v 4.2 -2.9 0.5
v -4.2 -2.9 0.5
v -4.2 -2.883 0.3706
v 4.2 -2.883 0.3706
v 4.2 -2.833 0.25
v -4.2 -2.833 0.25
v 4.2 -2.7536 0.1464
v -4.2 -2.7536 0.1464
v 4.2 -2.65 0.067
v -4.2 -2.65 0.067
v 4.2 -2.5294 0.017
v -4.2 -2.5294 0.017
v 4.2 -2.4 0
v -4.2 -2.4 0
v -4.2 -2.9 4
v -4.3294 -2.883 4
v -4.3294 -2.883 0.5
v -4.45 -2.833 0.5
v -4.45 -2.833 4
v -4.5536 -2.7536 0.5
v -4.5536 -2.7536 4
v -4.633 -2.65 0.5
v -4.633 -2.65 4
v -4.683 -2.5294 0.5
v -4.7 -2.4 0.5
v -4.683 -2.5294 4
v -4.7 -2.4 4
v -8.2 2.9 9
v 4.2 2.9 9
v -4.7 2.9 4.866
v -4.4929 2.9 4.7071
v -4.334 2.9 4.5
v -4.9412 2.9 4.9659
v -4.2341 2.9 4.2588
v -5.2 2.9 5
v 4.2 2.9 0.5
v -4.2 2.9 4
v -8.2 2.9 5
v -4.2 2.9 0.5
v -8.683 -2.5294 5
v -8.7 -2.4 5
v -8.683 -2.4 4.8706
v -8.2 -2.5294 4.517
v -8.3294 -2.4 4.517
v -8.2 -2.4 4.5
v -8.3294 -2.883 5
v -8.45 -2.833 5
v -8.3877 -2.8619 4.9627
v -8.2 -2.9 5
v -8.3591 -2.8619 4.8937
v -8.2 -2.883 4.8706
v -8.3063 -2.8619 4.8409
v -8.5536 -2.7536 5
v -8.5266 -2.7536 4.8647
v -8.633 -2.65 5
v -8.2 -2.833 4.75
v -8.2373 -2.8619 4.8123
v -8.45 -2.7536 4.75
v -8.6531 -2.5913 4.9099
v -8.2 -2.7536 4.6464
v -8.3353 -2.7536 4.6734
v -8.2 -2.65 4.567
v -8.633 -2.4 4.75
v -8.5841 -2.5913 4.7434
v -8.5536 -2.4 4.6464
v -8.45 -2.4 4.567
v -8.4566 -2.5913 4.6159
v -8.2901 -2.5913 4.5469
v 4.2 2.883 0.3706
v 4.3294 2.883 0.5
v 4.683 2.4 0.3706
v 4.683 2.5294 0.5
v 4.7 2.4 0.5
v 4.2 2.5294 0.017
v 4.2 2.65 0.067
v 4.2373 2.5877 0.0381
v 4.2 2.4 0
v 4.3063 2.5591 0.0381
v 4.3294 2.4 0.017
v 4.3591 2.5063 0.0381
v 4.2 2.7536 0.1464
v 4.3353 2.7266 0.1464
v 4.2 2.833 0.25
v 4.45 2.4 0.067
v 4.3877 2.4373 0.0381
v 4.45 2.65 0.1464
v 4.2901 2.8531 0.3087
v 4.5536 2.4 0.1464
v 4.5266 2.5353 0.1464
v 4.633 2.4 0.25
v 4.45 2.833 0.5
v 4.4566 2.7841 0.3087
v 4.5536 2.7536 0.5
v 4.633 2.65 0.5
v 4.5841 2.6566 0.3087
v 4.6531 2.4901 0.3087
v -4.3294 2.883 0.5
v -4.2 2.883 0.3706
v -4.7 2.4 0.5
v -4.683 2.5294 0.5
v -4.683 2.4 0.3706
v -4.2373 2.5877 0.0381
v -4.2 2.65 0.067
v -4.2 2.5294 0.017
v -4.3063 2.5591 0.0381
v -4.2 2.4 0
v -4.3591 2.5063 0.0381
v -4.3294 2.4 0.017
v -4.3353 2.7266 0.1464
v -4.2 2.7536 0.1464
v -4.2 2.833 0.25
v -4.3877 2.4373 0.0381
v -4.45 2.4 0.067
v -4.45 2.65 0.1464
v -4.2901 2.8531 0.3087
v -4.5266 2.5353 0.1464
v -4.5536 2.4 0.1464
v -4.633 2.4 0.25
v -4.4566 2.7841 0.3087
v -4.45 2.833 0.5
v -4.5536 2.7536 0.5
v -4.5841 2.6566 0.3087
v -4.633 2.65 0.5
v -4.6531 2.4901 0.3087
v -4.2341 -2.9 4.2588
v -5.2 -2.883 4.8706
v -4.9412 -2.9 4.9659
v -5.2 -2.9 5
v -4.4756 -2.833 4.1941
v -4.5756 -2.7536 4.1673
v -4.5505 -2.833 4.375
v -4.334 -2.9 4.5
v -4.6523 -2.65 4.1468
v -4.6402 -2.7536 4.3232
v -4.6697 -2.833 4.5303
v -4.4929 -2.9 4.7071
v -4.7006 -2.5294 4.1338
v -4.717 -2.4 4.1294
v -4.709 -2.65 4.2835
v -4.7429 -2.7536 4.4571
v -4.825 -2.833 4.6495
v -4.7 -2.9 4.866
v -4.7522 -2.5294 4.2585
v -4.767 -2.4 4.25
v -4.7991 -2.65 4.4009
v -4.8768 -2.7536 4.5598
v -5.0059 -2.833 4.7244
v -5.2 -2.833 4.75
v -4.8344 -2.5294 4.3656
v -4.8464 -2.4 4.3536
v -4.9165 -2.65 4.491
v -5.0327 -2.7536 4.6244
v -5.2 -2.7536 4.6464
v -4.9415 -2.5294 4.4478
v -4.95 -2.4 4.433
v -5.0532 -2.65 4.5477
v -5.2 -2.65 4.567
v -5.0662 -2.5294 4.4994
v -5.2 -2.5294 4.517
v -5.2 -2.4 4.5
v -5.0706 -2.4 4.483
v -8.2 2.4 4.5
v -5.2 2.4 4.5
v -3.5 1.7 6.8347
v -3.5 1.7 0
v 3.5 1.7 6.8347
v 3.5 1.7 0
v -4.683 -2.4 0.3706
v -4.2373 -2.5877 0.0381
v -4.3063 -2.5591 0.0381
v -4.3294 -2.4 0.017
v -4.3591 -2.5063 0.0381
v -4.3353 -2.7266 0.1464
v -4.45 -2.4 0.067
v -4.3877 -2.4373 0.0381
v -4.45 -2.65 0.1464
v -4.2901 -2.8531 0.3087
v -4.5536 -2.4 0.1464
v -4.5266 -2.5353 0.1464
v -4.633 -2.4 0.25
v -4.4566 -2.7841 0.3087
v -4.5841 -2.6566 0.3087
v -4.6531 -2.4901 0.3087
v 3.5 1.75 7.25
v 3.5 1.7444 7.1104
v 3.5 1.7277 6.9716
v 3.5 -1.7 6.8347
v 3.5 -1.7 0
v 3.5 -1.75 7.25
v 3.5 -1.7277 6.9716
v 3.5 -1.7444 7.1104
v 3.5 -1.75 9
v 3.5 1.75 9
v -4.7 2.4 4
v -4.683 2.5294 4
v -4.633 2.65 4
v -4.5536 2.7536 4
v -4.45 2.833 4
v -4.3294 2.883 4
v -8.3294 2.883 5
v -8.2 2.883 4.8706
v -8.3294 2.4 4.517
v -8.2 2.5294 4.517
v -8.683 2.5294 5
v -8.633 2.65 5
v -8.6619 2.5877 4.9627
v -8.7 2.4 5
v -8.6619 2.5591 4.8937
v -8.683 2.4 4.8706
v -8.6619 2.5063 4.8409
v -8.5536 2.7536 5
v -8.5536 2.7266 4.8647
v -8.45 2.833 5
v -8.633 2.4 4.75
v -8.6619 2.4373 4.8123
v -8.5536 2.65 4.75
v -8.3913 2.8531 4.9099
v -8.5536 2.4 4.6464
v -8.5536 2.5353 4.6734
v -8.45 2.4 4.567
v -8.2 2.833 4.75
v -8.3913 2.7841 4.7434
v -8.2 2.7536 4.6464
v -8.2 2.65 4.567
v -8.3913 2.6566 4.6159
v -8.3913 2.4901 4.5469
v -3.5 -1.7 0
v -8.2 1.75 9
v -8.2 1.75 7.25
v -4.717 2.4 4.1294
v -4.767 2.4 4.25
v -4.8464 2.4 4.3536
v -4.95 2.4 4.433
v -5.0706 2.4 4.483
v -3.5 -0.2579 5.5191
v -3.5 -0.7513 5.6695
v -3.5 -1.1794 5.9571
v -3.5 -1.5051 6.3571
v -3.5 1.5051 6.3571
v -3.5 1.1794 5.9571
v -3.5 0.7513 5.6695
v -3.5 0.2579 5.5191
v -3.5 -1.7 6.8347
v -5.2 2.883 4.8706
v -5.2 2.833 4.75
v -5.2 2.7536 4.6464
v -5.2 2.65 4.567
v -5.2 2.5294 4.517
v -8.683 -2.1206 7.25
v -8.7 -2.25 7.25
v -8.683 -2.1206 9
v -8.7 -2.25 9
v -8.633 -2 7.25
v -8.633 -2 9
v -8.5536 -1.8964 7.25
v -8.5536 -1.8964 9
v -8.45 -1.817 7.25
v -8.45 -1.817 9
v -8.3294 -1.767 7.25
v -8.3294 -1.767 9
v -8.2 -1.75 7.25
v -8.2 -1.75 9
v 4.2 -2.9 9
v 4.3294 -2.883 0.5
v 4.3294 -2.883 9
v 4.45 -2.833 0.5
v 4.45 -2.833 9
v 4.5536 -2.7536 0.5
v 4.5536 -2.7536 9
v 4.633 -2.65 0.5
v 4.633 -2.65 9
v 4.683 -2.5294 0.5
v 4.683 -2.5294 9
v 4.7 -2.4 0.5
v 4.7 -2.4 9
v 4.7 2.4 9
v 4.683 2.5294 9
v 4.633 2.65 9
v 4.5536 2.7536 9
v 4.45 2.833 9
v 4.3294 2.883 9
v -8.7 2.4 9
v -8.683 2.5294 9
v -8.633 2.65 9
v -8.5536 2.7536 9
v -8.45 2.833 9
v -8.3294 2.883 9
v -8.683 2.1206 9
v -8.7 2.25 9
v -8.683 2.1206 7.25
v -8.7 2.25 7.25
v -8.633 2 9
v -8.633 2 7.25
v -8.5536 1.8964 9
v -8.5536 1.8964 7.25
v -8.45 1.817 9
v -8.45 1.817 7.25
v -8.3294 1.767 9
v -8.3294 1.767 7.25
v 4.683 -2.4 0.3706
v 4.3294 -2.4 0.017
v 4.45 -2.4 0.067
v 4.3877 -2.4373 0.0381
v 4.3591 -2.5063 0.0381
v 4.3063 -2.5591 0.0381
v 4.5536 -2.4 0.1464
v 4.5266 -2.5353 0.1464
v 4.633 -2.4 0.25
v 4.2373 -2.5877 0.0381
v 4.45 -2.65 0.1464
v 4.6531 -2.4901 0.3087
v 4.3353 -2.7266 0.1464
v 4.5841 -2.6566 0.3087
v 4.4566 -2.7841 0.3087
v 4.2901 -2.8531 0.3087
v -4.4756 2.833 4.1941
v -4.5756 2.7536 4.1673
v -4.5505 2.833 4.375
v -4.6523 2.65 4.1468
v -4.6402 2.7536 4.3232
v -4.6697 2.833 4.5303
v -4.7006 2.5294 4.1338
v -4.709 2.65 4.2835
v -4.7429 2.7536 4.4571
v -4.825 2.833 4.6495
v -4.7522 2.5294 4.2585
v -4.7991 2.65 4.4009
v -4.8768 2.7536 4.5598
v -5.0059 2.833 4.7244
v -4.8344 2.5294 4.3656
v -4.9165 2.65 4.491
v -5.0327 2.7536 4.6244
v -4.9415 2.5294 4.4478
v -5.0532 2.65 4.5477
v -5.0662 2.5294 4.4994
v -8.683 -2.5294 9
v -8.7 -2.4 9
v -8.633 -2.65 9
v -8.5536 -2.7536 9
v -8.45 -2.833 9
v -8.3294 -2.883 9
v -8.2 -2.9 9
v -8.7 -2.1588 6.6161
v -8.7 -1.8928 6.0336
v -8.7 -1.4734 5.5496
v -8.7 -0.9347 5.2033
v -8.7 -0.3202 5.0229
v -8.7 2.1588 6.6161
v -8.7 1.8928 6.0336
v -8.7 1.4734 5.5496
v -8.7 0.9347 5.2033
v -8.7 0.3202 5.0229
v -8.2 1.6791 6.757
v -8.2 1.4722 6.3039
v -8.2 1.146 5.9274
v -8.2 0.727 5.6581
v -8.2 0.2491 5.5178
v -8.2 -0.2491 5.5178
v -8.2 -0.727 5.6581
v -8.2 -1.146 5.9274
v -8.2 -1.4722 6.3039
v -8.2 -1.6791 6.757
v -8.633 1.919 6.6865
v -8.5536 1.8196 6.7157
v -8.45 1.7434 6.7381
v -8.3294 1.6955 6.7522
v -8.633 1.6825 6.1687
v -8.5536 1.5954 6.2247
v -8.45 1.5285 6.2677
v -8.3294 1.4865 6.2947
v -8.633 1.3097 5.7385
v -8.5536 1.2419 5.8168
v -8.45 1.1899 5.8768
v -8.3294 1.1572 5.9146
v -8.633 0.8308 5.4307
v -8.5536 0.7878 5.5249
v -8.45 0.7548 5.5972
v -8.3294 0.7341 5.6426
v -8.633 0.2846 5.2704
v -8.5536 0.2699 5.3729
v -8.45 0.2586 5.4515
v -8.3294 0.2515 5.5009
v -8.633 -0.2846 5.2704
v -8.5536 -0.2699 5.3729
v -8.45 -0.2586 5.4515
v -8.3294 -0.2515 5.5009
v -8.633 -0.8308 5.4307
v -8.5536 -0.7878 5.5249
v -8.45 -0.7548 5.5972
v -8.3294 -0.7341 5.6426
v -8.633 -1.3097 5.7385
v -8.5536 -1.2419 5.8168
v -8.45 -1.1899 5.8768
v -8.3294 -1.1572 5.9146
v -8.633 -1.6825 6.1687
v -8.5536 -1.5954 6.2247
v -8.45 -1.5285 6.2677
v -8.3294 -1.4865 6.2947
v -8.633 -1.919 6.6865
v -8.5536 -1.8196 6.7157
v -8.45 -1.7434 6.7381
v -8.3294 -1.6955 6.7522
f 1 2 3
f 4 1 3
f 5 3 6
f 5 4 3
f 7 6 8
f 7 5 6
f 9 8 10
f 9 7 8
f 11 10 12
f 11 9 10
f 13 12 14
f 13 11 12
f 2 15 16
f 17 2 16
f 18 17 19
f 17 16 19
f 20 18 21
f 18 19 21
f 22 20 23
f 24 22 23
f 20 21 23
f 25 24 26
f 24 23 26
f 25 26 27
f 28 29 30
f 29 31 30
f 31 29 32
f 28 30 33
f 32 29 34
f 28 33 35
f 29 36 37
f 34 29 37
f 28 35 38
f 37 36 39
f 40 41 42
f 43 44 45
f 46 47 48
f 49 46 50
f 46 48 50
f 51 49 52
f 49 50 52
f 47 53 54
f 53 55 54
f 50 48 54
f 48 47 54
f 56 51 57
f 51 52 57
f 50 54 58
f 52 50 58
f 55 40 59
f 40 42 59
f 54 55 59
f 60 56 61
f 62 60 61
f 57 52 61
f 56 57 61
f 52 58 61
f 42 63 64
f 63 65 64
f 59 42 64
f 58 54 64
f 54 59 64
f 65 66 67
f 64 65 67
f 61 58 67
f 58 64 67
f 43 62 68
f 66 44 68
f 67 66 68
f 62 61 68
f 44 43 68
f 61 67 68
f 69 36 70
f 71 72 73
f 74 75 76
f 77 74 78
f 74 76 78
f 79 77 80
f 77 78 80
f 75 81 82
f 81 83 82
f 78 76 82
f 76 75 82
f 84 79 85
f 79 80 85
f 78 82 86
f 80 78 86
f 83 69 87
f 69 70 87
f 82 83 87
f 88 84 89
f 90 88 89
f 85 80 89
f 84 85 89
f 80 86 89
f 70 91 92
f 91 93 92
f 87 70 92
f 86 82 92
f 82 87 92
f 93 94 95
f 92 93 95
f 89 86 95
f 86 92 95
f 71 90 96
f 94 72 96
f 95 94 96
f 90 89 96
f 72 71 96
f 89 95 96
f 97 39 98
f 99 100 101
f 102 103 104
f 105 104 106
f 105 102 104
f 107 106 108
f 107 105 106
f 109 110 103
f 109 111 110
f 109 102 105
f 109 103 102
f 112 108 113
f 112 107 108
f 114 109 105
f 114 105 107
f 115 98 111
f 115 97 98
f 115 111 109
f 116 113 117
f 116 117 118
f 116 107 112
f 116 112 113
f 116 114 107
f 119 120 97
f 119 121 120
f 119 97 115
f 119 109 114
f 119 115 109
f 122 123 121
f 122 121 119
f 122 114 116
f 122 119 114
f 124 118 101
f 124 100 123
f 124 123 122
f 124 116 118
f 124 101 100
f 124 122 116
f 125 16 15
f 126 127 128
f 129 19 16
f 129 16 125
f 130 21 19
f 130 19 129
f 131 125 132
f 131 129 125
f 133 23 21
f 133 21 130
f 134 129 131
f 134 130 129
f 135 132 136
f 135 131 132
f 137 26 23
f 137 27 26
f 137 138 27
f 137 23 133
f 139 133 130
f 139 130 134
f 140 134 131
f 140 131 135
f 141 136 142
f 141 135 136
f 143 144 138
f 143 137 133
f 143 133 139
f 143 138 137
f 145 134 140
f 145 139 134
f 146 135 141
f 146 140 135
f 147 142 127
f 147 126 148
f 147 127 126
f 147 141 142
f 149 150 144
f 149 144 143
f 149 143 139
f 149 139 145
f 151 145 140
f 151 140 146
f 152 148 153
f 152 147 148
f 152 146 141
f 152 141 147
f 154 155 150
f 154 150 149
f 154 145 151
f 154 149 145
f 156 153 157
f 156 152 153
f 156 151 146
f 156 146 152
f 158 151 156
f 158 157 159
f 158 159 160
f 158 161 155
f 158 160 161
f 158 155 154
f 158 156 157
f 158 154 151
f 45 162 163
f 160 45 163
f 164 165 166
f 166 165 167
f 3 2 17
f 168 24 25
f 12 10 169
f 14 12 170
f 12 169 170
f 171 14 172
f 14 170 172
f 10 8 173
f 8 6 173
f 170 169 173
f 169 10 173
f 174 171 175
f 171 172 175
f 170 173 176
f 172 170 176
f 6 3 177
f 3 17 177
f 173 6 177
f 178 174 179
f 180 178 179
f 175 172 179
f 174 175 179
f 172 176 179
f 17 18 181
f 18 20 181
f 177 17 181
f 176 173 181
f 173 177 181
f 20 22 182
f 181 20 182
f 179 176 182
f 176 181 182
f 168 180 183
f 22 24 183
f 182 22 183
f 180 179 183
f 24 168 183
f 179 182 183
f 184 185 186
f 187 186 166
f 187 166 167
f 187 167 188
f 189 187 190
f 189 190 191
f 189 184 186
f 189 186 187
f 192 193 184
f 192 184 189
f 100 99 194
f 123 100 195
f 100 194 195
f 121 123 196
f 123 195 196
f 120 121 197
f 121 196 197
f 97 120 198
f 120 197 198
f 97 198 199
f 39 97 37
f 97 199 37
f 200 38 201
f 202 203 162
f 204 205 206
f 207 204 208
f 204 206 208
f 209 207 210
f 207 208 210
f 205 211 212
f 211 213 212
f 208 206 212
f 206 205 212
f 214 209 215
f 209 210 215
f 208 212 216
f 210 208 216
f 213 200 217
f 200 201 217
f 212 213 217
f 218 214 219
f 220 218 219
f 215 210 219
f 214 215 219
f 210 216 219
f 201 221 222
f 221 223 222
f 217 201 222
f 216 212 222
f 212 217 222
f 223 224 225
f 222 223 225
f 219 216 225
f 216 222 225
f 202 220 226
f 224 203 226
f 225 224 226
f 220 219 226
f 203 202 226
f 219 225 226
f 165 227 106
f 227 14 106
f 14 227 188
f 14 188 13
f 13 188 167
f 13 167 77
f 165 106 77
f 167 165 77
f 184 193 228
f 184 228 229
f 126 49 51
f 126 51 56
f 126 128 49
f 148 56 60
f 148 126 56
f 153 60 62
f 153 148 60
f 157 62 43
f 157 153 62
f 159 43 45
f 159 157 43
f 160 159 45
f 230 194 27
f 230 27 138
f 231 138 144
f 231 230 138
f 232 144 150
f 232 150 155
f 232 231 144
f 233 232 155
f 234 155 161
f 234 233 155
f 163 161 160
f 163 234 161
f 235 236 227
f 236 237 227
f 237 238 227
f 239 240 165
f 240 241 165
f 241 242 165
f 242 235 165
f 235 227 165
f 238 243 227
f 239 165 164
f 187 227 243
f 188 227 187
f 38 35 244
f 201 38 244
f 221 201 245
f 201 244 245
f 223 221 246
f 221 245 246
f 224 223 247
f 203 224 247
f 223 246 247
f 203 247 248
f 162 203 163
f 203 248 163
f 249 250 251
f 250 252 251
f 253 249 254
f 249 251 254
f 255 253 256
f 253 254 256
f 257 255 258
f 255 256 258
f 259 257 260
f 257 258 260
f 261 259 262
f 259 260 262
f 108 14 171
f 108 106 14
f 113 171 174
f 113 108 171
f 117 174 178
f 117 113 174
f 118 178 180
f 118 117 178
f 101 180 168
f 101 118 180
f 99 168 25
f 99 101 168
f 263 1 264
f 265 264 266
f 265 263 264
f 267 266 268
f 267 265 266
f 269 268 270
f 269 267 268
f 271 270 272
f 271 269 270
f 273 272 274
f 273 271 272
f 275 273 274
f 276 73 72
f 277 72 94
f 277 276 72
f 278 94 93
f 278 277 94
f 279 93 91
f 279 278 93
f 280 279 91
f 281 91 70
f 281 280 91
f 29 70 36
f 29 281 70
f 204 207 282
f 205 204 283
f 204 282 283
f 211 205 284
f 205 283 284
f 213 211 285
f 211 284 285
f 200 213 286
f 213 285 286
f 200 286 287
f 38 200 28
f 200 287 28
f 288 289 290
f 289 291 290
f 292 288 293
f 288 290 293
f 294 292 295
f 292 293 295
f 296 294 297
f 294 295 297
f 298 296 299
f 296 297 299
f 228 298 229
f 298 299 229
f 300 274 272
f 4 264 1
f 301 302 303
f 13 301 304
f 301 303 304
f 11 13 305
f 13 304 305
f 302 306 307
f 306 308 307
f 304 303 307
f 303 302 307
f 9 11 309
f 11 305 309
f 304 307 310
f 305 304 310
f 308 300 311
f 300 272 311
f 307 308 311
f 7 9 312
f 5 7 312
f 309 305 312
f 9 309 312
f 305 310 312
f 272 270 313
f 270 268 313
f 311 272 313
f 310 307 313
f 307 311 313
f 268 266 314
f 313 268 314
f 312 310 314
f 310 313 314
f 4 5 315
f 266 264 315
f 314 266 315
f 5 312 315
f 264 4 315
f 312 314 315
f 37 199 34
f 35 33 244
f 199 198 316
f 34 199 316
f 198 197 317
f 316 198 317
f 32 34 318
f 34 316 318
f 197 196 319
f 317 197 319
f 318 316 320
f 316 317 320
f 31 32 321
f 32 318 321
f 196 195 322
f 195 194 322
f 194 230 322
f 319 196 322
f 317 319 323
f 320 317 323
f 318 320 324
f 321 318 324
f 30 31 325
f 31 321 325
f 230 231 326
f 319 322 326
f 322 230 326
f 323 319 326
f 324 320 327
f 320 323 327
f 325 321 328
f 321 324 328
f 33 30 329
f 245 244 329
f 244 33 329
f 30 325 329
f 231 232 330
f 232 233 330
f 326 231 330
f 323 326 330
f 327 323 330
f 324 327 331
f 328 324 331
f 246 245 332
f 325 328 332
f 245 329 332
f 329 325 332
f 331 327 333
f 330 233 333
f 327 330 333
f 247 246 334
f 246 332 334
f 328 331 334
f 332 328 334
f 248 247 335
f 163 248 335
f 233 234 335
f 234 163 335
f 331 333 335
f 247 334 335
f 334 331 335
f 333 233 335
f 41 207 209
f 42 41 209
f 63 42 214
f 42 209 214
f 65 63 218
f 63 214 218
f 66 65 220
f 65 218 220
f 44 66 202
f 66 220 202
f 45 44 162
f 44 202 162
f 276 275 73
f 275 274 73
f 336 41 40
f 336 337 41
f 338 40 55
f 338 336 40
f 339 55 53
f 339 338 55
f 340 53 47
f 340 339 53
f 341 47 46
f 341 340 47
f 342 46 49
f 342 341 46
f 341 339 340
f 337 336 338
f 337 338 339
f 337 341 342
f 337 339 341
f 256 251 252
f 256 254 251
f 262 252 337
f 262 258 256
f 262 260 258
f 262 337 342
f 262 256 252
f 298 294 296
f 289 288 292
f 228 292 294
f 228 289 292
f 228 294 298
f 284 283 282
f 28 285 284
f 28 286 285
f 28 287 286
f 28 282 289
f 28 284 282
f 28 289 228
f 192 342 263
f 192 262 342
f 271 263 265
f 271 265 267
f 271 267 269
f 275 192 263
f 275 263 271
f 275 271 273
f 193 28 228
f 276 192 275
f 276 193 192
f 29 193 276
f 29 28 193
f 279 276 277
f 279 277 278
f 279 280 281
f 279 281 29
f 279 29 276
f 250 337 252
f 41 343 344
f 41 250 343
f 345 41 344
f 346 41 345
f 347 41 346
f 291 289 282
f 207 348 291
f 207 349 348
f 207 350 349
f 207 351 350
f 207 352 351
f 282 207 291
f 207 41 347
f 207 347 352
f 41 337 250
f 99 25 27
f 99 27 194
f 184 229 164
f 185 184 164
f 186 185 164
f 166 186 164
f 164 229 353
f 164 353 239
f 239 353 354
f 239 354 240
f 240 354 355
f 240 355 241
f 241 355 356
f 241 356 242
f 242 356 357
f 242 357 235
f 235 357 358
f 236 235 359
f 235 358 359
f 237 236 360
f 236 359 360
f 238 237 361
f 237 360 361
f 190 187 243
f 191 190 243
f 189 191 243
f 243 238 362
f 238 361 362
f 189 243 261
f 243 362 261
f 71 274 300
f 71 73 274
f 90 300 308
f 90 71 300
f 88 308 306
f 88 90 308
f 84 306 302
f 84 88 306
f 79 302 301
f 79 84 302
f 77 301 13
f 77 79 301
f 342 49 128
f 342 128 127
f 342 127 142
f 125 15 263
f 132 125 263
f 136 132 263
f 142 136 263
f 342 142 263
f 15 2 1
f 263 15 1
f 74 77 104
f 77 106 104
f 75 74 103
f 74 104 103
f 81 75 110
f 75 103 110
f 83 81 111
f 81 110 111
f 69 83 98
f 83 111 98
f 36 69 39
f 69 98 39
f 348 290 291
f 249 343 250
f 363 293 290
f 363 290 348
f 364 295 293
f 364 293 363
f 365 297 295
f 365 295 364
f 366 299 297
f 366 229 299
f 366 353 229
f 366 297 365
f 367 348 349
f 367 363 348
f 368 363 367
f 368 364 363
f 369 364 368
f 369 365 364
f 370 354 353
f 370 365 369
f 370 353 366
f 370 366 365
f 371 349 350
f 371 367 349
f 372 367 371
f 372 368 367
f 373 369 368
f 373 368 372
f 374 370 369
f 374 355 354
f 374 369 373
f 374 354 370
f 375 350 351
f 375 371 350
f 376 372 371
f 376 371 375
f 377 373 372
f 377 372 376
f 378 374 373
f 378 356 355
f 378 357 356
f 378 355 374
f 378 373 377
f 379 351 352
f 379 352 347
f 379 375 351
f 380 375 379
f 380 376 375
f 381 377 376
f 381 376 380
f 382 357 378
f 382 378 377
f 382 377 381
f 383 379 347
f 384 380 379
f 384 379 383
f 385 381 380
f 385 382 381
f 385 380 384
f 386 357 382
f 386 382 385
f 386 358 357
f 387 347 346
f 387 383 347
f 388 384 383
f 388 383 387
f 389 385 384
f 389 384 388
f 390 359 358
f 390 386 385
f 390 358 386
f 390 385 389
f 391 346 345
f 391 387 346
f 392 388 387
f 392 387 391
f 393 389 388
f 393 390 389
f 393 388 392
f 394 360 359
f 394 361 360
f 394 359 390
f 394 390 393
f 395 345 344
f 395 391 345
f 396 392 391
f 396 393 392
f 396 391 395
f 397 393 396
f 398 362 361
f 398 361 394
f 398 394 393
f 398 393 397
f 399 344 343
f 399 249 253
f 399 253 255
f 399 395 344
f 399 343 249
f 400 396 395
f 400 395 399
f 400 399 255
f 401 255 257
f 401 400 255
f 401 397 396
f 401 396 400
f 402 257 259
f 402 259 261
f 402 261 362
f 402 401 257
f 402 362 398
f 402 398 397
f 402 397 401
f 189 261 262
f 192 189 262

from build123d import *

# Parameters (mm, degrees)
F0_W     = 4
F0_H     = 5.8
F0_W_2   = 9.4
F0_W_3   = 7
F0_H_2   = 3.4
F1_DEPTH = 9
F2_DEPTH = 4.5
F4_DEPTH = 12.2
F5_R     = 0.49999


# Not quite as in the source:
# - a fillet or chamfer is up to 0.001 mm smaller than in the source, because OpenCascade refuses the exact size


with BuildPart() as f1:
    # F0 (on Top) → F1 (new body)
    with BuildSketch(Plane.XY):
        with Locations((-6.7, 0)):
            Rectangle(F0_W, F0_H)
        Rectangle(F0_W_2, F0_H)
        Rectangle(F0_W_3, F0_H_2, mode=Mode.SUBTRACT)
    extrude(amount=F1_DEPTH)

    # F0 (on Top) → F2 (cut)
    with BuildSketch(Plane.XY):
        with Locations((-6.7, 0)):
            Rectangle(F0_W, F0_H)
    extrude(amount=F2_DEPTH, mode=Mode.SUBTRACT)

    # F3 (on face) → F4 (cut, through all)
    with BuildSketch(Plane(origin=(-8.7, 0, 0), x_dir=(0, -1, 0), z_dir=(-1, 0, 0))):
        with BuildLine():
            Line((-1.75, 9), (-1.75, 7.25))
            ThreePointArc((-1.75, 7.25), (0, 5.5), (1.75, 7.25))
            Line((1.75, 7.25), (1.75, 9))
            Line((1.75, 9), (-1.75, 9))
        make_face()
    extrude(amount=-F4_DEPTH, mode=Mode.SUBTRACT)

    # F5 (radius 0.5 in the source; OpenCascade refuses exactly that, so slightly less here)
    f5_edges = [f1.edges().sort_by_distance(p)[0] for p in [
        (-4.7, 2.9, 2.25),
        (-6.7, 2.9, 4.5),
        (-4.7, 0, 4.5),
        (-4.7, -2.9, 2.25),
        (4.7, -2.9, 4.5),
        (4.7, 2.9, 4.5),
        (0, 2.9, 0),
        (4.7, 0, 0),
        (0, -2.9, 0),
        (-4.7, 0, 0),
        (-8.7, 2.9, 6.75),
        (-8.7, 0, 4.5),
        (-8.7, -2.9, 6.75),
        (-8.7, 0, 5.5),
        (-8.7, -1.75, 8.125),
        (-8.7, 1.75, 8.125),
        (-6.7, -2.9, 4.5),
    ]]
    fillet(f5_edges, radius=F5_R)


solid = f1.part
